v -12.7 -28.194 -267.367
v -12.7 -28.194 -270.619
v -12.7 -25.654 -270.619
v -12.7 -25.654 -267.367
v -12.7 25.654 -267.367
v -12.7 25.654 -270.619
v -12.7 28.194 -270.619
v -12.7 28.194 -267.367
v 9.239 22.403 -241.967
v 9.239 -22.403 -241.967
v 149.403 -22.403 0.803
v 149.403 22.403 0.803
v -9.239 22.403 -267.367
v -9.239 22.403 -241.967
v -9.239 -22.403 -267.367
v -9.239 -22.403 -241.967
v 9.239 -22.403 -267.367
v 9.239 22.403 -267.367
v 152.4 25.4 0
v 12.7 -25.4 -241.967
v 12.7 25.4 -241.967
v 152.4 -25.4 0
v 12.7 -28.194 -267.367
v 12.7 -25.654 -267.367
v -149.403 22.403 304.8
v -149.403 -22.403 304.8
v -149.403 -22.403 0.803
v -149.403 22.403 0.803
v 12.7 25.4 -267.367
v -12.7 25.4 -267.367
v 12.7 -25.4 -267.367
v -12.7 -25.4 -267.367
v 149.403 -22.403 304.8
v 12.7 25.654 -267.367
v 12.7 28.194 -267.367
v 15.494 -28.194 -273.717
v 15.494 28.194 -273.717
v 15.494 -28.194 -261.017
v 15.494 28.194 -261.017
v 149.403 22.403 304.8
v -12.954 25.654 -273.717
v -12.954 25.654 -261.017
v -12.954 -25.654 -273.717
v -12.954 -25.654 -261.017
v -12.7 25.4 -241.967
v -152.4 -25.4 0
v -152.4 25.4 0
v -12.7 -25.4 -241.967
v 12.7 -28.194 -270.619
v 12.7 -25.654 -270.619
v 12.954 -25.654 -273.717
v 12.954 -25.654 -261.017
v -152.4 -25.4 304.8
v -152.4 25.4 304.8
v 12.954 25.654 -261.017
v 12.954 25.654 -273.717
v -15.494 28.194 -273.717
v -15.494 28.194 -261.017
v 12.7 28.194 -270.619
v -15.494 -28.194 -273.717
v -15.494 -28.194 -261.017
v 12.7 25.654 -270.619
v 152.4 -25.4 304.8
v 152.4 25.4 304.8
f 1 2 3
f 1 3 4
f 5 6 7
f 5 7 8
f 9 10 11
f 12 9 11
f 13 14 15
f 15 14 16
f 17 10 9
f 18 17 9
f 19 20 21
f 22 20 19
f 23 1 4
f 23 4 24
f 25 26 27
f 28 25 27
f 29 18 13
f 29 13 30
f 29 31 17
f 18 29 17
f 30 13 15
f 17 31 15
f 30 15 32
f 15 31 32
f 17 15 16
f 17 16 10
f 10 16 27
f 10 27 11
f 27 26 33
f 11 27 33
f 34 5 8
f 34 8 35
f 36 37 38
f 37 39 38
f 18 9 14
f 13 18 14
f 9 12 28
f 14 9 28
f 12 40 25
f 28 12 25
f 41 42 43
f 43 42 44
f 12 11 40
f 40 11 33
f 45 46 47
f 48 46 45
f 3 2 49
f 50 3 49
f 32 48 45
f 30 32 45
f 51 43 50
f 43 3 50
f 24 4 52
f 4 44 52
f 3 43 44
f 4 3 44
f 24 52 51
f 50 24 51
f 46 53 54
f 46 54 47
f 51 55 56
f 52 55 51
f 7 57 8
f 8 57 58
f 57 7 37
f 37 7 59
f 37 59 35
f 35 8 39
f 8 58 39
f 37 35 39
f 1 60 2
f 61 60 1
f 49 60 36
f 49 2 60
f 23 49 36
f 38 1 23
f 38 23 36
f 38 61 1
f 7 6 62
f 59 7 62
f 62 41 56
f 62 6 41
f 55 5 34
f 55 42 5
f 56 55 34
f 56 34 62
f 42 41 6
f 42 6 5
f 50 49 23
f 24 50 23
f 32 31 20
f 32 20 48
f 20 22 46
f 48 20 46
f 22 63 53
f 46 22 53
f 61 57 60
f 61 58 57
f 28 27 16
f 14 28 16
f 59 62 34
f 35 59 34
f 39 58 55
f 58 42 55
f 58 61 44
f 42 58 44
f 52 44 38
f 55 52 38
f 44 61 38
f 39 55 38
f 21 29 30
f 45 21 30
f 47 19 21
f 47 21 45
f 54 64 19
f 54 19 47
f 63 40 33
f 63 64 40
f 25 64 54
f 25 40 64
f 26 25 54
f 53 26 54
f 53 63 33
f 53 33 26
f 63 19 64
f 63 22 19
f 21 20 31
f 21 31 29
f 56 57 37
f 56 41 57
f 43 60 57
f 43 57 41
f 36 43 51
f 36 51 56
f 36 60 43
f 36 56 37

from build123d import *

# Parameters (mm, degrees)
F1_DEPTH      = 25.4
F1_DEPTH_BACK = 25.4
F2_T          = -2.9972
F3_DEPTH      = 25.4
F3_DEPTH_BACK = 25.4
F4_DEPTH      = 25.4
F5_W          = 30.988
F5_H          = 56.388
F5_W_2        = 25.908
F5_H_2        = 51.308
F6_DEPTH      = 6.35
F6_DEPTH_BACK = 6.35
F7_W          = 25.4
F7_H          = 3.2512
F8_DEPTH      = 76.2


with BuildPart() as f1:
    # F0 (on Front) → F1 (new body, two sides)
    with BuildSketch(Plane.XZ) as f1_sk:
        Polygon((12.7, -241.9674978174), (152.4, 0), (152.4, 304.8), (-152.4, 304.8), (-152.4, 0), (-12.7, -241.9674978174), align=None)
        Polygon((0, -263.9645430735), (12.7, -241.9674978174), (-12.7, -241.9674978174), align=None)
    extrude(amount=F1_DEPTH)
    extrude(f1_sk.sketch, amount=-F1_DEPTH_BACK)

    # F2
    f2_openings = [f1.faces().sort_by_distance(p)[0] for p in [
        (0, 0, 304.8),
    ]]
    offset(amount=F2_T, openings=f2_openings)

    # F0 (on Front) → F3 (cut, two sides)
    with BuildSketch(Plane.XZ) as f3_sk:
        Polygon((0, -263.9645430735), (12.7, -241.9674978174), (-12.7, -241.9674978174), align=None)
    extrude(amount=-F3_DEPTH, mode=Mode.SUBTRACT)
    extrude(f3_sk.sketch, amount=F3_DEPTH_BACK, mode=Mode.SUBTRACT)

    # F4 (add): a face of the model
    f4_faces = [f1.faces().sort_by_distance(p)[0] for p in [
        (12.1320387337, 0, -241.9674978174),
    ]]
    extrude(f4_faces, amount=F4_DEPTH)


with BuildPart() as f6:
    # F5 (on face) → F6 (new body, two sides)
    with BuildSketch(Plane(origin=(0, 0, -267.3674978174), x_dir=(1, 0, 0), z_dir=(0, 0, -1))) as f6_sk:
        Rectangle(F5_W, F5_H)
        Rectangle(F5_W_2, F5_H_2, mode=Mode.SUBTRACT)
    extrude(amount=-F6_DEPTH)
    extrude(f6_sk.sketch, amount=F6_DEPTH_BACK)

    # F7 (on face) → F8 (cut)
    with BuildSketch(Plane.XZ.offset(28.194)):
        with Locations((0, -268.9930978174)):
            Rectangle(F7_W, F7_H)
    extrude(amount=-F8_DEPTH, mode=Mode.SUBTRACT)


solid = Compound([f1.part, f6.part])
